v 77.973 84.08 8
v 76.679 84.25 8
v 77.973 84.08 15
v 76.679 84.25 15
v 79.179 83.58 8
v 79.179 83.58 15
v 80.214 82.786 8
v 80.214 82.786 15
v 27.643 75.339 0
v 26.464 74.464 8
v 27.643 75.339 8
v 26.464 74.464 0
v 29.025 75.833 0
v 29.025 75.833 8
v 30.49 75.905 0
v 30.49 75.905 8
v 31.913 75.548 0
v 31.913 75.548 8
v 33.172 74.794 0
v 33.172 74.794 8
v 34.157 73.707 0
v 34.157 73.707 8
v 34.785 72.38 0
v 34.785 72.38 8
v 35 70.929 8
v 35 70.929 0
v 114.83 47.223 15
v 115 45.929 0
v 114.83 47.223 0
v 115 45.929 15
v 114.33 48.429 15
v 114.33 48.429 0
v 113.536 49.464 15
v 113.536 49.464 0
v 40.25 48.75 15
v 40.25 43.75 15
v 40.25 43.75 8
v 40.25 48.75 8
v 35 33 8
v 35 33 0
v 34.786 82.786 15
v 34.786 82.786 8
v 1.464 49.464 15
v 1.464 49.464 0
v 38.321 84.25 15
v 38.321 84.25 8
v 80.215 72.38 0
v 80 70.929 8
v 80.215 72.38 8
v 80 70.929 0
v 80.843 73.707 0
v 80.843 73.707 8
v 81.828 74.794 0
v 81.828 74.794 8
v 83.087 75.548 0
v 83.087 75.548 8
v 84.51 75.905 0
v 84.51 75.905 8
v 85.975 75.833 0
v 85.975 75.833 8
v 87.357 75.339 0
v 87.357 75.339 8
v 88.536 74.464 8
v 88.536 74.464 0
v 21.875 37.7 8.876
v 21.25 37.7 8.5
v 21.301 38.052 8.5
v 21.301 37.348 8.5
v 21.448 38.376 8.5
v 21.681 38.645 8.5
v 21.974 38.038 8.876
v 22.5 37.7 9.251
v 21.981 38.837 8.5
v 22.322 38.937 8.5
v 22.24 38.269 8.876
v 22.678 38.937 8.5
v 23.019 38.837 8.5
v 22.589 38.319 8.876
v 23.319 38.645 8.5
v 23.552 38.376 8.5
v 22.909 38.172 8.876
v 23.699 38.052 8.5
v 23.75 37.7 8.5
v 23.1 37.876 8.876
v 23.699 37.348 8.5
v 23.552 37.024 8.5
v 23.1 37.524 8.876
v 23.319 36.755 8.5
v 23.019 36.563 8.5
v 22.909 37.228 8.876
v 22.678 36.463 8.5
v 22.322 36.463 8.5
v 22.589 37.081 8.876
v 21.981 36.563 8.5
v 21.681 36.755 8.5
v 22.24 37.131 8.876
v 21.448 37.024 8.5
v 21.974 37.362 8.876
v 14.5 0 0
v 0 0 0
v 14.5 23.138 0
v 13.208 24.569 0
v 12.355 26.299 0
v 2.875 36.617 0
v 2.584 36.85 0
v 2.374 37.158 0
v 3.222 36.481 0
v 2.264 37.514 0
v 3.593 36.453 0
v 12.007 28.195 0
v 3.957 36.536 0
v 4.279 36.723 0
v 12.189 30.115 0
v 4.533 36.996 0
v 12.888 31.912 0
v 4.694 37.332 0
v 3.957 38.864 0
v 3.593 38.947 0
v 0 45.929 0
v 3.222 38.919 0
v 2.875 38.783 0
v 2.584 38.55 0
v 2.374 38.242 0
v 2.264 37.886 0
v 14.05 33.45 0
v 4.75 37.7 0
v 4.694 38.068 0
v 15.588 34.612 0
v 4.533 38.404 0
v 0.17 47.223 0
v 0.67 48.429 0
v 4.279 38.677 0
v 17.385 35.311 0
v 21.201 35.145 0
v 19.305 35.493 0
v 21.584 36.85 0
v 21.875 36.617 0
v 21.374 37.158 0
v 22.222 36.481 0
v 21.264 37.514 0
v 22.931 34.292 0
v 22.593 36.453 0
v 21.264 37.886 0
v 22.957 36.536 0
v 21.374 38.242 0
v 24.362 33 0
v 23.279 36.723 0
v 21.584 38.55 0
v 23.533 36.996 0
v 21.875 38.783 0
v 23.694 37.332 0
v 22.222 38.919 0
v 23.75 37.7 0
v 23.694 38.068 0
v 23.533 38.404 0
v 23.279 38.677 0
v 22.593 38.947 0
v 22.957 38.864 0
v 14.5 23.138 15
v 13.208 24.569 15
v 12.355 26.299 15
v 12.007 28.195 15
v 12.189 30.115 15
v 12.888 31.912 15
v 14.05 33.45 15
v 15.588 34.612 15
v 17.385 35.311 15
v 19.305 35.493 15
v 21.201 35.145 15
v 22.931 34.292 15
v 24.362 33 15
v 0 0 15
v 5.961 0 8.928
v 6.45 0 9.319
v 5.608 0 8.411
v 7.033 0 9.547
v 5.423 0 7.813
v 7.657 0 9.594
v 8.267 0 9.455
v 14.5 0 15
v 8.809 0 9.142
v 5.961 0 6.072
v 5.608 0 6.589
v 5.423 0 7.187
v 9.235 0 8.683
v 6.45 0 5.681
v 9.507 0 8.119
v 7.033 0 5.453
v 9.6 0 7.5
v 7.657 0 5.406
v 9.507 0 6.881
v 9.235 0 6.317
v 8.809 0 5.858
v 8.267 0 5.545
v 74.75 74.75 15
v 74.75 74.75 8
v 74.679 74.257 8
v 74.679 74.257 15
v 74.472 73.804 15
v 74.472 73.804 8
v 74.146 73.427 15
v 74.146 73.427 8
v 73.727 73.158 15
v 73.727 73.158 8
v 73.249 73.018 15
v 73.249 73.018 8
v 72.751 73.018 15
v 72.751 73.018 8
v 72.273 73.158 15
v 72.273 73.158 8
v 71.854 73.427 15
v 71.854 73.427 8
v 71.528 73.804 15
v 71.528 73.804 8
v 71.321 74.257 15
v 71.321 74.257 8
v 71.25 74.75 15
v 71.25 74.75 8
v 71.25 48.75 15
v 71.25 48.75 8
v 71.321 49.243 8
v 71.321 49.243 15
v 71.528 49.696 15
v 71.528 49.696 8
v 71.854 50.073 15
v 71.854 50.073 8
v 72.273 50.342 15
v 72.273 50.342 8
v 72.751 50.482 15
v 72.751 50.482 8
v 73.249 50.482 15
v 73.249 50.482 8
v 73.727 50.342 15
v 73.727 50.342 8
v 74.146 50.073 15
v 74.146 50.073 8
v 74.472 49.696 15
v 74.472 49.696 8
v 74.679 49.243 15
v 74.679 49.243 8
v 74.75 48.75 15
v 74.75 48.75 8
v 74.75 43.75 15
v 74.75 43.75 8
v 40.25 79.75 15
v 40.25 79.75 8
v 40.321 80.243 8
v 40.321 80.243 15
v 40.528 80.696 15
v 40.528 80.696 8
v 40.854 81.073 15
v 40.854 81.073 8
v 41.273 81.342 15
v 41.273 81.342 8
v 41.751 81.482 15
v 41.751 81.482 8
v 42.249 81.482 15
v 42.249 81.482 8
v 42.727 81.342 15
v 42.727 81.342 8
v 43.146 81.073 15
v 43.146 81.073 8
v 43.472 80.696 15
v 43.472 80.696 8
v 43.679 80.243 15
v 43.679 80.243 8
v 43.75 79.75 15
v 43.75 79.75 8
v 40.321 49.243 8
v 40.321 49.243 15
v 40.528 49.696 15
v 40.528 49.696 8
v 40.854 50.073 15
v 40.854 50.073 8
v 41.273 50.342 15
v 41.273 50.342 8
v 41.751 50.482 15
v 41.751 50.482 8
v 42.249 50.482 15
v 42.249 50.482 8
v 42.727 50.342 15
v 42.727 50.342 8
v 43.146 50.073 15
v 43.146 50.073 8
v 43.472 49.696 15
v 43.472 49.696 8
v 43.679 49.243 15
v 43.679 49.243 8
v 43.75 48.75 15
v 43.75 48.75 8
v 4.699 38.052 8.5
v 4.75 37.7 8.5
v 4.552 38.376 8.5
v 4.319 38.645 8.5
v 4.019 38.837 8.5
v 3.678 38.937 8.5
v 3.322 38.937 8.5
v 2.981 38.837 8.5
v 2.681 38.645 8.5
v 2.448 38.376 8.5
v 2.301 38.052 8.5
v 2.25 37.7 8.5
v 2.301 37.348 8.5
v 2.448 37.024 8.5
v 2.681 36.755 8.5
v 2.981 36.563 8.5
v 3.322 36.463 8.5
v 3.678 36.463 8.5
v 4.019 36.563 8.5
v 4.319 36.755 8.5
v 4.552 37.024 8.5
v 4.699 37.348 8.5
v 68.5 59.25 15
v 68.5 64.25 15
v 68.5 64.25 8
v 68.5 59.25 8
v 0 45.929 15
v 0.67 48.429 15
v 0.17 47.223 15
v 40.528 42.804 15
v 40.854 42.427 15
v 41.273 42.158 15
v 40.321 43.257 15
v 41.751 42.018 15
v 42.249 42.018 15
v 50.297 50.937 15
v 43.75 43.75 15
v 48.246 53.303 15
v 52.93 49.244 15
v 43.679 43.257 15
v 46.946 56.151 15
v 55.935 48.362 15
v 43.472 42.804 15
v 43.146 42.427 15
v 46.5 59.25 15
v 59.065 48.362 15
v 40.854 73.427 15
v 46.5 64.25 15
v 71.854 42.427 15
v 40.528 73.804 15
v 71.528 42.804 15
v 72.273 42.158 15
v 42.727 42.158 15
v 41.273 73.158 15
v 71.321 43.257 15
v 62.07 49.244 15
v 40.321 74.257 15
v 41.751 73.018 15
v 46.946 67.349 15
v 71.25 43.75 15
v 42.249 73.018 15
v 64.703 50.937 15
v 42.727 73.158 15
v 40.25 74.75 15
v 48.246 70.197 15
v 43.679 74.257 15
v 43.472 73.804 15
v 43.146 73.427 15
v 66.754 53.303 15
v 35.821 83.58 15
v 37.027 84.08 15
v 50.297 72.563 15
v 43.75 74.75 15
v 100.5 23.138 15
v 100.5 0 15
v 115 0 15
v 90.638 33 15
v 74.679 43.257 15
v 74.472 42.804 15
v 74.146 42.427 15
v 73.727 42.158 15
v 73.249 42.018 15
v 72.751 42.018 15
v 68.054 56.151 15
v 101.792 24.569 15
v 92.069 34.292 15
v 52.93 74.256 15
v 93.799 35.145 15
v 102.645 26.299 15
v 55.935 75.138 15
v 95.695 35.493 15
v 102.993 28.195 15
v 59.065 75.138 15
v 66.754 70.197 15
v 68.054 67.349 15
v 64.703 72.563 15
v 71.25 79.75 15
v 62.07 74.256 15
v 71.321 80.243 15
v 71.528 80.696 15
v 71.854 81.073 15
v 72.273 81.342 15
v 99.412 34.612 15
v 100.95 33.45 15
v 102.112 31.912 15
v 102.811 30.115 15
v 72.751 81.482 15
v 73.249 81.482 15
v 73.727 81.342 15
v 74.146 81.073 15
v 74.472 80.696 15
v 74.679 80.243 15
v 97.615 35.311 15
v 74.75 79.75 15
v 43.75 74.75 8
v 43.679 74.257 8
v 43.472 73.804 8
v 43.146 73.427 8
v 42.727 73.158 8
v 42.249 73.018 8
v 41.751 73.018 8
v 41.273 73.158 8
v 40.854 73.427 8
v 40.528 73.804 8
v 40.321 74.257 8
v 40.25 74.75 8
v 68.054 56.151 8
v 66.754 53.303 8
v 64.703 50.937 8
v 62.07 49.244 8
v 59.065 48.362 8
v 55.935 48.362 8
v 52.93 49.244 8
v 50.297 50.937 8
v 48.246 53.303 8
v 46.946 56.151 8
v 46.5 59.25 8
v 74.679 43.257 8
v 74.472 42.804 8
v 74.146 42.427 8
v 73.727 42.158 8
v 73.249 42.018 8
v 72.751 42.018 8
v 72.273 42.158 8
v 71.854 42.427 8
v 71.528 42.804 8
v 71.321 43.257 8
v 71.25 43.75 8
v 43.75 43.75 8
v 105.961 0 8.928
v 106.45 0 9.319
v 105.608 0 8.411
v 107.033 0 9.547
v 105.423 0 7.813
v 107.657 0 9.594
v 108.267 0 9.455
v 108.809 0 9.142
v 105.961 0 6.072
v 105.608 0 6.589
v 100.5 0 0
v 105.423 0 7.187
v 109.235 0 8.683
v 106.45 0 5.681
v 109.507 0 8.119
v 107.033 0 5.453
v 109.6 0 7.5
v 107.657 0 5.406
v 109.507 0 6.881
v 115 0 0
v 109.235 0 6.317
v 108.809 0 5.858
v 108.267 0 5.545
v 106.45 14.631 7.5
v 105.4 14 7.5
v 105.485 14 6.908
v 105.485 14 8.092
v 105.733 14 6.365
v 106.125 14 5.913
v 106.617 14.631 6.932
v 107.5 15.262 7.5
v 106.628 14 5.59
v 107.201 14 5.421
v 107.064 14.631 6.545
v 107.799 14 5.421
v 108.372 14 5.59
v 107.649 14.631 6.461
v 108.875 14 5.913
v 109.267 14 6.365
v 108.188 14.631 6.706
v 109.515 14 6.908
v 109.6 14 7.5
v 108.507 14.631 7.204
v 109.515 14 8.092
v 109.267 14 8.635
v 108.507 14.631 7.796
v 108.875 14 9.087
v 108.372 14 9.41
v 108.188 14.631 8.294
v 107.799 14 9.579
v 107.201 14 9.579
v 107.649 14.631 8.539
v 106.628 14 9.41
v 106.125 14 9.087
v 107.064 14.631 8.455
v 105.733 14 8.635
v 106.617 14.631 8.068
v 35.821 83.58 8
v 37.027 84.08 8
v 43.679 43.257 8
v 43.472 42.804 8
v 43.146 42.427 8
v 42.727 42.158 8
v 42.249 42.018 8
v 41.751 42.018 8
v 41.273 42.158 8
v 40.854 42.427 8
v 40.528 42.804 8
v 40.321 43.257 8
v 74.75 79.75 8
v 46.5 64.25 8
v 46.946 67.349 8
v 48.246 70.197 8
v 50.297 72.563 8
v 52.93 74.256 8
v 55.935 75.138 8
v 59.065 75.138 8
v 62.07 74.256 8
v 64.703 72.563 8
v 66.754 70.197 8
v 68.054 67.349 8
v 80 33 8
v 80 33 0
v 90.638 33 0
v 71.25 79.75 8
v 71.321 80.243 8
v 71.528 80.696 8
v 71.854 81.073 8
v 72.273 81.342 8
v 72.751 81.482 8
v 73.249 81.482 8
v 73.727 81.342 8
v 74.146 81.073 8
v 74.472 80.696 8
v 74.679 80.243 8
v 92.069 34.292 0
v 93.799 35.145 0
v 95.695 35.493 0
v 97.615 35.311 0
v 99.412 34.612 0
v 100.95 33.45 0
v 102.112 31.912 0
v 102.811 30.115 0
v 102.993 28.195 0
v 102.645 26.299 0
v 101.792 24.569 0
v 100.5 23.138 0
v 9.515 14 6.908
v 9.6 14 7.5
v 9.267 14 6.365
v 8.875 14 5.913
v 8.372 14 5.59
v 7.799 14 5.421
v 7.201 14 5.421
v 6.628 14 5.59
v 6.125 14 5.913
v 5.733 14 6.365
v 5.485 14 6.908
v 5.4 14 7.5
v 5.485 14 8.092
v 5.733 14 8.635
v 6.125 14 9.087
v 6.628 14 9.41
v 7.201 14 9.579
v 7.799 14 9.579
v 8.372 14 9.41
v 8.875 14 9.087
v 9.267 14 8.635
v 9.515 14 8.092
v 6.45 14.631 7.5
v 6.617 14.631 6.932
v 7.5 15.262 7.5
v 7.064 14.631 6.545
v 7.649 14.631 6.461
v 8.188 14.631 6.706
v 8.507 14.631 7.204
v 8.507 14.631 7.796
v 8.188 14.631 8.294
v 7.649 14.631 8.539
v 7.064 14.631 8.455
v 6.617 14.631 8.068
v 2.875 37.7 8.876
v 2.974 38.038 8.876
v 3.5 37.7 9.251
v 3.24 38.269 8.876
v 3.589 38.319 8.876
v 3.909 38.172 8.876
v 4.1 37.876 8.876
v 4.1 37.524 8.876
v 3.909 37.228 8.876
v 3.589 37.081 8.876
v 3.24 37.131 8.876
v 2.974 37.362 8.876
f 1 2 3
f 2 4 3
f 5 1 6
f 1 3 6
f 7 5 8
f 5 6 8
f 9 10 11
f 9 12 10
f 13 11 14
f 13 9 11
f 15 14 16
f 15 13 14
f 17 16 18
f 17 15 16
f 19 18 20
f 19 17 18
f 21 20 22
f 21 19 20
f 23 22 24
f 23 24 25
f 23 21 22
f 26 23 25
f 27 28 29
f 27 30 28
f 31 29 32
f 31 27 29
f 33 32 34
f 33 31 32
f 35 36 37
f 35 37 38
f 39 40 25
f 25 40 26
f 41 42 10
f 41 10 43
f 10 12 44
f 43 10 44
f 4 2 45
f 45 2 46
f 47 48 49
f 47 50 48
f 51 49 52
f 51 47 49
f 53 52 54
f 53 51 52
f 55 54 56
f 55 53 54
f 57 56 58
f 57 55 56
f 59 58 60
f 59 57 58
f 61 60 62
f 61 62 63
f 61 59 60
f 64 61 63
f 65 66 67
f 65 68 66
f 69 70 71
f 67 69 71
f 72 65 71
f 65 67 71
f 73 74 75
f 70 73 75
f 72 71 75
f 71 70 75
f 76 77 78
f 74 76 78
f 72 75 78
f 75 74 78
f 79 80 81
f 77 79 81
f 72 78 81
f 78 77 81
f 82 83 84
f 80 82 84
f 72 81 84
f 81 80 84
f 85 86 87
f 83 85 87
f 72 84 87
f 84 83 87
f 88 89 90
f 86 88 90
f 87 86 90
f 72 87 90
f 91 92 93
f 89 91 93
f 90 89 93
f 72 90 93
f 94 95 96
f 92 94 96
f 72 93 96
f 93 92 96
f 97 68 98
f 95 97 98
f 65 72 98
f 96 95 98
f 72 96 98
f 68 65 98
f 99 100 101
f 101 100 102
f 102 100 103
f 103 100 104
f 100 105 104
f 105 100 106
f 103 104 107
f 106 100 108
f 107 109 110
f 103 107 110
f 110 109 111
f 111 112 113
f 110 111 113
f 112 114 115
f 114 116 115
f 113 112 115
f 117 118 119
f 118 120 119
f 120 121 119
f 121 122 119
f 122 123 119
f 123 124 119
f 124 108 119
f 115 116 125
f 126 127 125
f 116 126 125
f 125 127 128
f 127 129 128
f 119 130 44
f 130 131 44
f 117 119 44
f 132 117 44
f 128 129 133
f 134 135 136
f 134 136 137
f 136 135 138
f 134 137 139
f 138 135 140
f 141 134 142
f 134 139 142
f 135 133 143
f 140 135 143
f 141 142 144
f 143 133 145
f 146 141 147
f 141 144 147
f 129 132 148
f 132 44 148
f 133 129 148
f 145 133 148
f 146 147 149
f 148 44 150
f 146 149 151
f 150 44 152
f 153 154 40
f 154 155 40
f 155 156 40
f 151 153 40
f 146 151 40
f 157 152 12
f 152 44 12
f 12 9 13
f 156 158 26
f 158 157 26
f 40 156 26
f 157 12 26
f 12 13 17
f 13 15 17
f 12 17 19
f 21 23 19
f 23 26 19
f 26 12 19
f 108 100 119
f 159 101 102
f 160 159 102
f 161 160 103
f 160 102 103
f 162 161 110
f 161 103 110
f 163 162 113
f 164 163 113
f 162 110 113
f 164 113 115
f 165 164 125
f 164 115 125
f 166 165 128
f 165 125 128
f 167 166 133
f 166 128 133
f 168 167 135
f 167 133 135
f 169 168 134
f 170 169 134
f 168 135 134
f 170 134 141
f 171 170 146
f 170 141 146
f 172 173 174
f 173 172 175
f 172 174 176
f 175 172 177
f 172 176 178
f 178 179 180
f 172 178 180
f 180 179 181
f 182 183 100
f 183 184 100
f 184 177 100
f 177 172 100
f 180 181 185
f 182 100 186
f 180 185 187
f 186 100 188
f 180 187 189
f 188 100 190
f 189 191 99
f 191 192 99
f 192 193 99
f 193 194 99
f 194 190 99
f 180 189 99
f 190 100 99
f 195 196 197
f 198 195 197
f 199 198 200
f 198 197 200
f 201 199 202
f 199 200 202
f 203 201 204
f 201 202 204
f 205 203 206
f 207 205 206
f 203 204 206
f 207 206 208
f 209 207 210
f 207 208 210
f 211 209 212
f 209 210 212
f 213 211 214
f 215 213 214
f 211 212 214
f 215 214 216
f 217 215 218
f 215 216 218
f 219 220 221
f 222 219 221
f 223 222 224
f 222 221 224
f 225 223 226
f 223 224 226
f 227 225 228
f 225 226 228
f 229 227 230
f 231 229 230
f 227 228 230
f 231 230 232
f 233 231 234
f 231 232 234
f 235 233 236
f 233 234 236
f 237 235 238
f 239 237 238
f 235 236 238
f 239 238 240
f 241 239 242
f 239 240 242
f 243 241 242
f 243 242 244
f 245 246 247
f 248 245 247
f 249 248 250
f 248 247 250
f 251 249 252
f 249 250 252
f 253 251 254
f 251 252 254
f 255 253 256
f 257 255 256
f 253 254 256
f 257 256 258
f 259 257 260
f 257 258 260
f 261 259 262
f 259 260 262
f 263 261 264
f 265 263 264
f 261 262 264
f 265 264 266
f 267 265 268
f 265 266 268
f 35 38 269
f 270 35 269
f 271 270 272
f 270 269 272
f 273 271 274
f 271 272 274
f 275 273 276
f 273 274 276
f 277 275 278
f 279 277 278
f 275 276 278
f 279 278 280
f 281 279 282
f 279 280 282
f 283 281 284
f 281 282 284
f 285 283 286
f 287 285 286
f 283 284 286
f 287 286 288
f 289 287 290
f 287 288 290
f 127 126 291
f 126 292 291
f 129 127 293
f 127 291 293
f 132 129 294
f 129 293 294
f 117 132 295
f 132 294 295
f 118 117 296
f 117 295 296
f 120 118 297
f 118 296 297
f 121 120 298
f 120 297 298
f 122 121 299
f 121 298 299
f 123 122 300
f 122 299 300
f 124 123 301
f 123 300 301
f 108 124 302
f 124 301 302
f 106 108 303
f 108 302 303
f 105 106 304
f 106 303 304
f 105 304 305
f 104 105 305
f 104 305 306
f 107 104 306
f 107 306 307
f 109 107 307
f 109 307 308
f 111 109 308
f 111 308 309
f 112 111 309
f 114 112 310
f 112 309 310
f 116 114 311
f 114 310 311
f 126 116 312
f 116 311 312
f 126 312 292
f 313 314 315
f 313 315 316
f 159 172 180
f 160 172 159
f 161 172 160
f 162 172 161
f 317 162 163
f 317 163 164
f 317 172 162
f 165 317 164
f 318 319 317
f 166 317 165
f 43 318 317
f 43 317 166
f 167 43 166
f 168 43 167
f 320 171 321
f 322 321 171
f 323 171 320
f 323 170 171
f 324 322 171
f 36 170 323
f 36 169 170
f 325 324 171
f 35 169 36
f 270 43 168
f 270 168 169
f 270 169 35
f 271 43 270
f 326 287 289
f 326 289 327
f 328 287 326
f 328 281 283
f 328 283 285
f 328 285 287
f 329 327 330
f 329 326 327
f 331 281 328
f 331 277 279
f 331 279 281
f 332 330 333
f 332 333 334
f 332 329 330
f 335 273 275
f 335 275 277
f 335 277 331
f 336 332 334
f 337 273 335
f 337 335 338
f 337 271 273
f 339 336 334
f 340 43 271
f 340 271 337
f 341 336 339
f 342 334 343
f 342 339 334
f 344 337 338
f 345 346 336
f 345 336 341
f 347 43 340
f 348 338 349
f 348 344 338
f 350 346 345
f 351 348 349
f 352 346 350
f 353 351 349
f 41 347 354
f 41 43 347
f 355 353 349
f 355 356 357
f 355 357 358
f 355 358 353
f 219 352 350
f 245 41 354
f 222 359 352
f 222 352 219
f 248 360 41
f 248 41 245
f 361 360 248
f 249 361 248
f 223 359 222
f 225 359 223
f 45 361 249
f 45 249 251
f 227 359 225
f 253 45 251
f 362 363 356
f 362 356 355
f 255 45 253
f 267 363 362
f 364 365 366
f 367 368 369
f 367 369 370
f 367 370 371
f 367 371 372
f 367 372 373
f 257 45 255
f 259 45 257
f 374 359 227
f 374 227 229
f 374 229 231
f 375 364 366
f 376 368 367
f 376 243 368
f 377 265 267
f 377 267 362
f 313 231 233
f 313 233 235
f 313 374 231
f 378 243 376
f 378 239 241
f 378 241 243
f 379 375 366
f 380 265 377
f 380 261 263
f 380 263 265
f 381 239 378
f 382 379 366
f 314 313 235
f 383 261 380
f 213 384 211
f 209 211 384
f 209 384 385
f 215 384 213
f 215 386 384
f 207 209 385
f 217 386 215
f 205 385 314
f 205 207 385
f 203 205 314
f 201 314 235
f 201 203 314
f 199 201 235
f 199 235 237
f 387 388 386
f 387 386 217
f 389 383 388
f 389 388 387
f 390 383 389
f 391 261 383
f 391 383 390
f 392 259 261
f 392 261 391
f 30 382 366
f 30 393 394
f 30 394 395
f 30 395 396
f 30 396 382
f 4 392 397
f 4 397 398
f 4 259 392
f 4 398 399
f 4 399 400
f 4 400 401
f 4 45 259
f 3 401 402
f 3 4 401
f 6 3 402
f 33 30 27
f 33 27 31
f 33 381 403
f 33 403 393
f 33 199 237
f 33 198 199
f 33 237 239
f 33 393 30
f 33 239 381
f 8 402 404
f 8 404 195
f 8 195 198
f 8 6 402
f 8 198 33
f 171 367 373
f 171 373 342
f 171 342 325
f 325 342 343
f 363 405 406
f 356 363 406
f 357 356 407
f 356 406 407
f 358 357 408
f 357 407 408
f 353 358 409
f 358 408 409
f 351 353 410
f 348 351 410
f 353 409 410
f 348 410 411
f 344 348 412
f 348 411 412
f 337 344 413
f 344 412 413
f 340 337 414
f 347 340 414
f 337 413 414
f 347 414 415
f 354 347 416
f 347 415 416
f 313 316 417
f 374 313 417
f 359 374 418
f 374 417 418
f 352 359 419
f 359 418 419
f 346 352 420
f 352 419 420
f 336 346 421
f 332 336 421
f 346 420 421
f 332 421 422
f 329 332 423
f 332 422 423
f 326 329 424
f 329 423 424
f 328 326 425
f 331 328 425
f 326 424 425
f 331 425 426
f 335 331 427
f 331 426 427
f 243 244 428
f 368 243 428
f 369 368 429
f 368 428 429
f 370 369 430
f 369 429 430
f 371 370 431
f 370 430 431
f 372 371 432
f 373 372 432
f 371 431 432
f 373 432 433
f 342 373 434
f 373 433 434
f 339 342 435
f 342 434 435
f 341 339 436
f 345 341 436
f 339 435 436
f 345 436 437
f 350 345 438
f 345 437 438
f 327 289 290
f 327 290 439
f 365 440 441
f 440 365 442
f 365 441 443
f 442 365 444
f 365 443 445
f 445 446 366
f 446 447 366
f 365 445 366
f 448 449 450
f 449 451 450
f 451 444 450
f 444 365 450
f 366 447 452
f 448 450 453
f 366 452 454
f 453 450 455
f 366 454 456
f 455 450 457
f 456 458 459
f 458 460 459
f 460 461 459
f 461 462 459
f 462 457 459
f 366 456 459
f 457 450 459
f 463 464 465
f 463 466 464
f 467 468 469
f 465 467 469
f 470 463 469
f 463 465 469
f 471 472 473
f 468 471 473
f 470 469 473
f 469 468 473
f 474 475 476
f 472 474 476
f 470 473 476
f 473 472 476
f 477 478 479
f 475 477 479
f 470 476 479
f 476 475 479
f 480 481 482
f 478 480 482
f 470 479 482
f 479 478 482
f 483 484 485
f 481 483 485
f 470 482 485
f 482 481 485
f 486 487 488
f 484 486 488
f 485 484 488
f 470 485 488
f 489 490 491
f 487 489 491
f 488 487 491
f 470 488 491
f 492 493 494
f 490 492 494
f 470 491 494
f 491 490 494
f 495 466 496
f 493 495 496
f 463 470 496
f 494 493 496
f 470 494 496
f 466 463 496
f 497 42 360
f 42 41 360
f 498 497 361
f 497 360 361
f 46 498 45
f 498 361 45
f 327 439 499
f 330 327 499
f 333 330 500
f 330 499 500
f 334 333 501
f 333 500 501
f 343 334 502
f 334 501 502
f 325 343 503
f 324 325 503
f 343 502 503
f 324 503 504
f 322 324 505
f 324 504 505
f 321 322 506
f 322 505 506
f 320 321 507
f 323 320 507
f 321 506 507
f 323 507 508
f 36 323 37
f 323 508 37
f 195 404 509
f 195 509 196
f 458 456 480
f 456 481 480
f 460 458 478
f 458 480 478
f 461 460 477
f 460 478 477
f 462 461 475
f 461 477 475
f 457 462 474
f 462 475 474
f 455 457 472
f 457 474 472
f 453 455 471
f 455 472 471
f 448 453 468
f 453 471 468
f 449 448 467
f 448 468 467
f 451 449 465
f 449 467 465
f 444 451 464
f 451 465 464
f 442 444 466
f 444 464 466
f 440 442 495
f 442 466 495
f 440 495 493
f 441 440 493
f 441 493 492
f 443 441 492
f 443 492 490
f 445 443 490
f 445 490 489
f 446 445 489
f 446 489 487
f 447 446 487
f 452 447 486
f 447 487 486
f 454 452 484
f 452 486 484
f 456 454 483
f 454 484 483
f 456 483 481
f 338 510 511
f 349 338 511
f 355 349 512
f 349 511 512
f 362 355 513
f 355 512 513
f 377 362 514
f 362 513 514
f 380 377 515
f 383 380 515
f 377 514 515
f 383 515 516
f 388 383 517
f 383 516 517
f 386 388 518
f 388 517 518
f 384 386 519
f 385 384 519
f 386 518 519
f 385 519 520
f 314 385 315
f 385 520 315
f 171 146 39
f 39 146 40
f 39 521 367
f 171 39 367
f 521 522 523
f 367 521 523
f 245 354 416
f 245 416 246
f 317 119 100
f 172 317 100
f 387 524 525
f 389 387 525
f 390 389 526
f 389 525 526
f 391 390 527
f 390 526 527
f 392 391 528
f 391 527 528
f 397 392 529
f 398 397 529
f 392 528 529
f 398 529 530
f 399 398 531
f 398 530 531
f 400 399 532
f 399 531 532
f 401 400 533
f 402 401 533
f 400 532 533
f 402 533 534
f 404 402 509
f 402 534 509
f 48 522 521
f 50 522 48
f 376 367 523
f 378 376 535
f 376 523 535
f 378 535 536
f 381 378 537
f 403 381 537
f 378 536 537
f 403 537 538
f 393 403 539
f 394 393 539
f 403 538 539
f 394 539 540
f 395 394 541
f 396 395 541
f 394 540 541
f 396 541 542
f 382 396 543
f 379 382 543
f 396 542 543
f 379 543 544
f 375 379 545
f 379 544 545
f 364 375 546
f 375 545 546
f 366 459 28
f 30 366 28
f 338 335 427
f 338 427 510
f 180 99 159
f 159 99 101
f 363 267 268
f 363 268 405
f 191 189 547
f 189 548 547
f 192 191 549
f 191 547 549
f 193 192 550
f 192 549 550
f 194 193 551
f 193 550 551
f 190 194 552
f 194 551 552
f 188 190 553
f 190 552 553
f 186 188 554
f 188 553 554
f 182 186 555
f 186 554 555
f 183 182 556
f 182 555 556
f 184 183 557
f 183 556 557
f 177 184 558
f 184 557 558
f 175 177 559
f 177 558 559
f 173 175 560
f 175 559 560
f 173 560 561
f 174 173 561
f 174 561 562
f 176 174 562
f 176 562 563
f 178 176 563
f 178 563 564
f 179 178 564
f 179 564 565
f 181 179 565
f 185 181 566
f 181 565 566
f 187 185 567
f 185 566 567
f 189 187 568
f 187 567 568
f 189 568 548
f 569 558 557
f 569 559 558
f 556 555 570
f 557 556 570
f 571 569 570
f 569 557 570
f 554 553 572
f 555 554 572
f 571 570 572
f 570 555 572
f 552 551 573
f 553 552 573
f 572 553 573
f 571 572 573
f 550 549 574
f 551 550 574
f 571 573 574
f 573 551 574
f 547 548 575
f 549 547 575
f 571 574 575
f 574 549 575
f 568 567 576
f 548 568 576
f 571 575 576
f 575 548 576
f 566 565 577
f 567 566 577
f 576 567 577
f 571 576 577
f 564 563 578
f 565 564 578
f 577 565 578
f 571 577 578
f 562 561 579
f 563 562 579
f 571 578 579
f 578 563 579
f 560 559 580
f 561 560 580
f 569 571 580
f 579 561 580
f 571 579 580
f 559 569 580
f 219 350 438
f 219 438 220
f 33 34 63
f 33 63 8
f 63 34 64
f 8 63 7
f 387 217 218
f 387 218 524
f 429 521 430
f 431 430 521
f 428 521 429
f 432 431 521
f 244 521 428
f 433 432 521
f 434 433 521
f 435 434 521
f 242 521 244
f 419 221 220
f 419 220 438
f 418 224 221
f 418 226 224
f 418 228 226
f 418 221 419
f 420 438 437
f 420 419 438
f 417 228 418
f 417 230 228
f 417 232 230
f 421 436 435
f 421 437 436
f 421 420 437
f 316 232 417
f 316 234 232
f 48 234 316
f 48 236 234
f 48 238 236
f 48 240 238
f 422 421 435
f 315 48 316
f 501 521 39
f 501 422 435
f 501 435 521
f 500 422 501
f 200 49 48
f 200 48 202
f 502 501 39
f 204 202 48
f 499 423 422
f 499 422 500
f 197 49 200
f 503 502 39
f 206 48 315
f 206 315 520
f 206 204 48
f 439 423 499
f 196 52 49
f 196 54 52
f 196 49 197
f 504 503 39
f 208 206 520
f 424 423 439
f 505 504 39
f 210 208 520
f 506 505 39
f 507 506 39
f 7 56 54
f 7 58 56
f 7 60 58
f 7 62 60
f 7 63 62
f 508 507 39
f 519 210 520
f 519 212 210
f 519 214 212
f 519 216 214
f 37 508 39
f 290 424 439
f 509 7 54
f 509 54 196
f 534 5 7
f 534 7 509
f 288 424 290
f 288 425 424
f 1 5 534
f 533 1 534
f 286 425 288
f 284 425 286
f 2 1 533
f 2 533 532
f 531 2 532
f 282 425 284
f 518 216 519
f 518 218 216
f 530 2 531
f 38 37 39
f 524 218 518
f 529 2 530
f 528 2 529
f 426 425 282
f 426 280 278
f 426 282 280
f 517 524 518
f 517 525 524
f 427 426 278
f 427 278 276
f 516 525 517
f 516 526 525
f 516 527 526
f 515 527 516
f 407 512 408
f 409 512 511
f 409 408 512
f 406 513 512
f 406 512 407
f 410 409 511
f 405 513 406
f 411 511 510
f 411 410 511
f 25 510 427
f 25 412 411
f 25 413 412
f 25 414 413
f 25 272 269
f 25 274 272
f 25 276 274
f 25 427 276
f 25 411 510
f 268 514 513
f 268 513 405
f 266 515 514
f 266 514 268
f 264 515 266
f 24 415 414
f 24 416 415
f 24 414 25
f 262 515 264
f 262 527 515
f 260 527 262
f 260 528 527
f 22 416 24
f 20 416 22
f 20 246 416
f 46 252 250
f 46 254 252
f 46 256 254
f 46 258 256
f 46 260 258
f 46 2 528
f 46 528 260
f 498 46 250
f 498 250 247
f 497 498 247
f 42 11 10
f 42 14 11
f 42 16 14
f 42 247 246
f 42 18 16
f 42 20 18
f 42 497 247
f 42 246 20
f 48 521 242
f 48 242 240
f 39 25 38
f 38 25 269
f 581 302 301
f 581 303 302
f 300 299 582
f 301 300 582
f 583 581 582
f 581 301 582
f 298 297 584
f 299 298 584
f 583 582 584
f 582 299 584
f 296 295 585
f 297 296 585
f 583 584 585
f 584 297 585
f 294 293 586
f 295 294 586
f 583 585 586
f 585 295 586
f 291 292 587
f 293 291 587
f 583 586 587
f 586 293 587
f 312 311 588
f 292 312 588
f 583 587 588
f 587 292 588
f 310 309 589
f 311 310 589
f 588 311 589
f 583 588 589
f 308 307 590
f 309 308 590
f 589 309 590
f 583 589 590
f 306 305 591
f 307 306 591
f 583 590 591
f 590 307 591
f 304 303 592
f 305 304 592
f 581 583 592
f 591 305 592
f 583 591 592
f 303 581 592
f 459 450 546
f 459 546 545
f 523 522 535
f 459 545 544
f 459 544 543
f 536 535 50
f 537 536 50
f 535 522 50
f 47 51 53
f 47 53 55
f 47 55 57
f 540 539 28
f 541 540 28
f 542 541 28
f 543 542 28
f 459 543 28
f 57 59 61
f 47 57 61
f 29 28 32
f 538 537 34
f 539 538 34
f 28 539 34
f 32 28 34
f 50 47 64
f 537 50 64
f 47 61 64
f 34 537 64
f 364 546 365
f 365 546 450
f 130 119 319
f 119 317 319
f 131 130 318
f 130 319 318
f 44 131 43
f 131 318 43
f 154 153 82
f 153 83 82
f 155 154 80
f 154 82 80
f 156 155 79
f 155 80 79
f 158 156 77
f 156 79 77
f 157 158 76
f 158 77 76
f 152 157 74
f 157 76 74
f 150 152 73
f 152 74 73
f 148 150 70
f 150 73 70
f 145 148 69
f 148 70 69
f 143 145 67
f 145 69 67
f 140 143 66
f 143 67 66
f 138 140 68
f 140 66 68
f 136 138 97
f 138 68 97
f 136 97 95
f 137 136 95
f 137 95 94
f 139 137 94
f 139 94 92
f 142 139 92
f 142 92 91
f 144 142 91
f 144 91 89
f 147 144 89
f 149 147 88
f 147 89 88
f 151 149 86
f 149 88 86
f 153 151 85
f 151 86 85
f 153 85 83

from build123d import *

# Parameters (mm, degrees)
AUFSATZ_LINEAR_AUSTRAGEN1_DEPTH = 15
M5_GEWINDEBOHRUNG1_D            = 4.2
M5_GEWINDEBOHRUNG1_DEPTH        = 14
M5_GEWINDEBOHRUNG1_TIP          = 1.2618073
SKIZZE4_W                       = 45
SKIZZE4_H                       = 51.25
SCHNITT_LINEAR_AUSTRAGEN1_DEPTH = 8
VERRUNDUNG1_R                   = 5
VERRUNDUNG2_R                   = 5
M3_GEWINDEBOHRUNG1_D            = 2.5
M3_GEWINDEBOHRUNG1_DEPTH        = 8.5
M3_GEWINDEBOHRUNG1_TIP          = 0.751075774


with BuildPart() as part:
    # Skizze1 → Aufsatz-Linear austragen1 (new body)
    with BuildSketch(Plane.XY):
        with BuildLine():
            Line((100.5, 0), (115, 0))
            Line((115, 0), (115, 48))
            Line((115, 48), (78.75, 84.25))
            Line((78.75, 84.25), (36.25, 84.25))
            Line((36.25, 84.25), (0, 48))
            Line((0, 48), (0, 0))
            Line((0, 0), (14.5, 0))
            Line((14.5, 0), (14.5, 23.138097353))
            ThreePointArc((14.5, 23.138097353), (14.050252532, 33.449747468), (24.361902647, 33))
            Line((24.361902647, 33), (90.638097353, 33))
            ThreePointArc((90.638097353, 33), (100.949747468, 33.449747468), (100.5, 23.138097353))
            Line((100.5, 23.138097353), (100.5, 0))
        make_face()
        with BuildLine():
            Line((68.5, 64.25), (68.5, 59.25))
            ThreePointArc((68.5, 59.25), (57.5, 48.25), (46.5, 59.25))
            Line((46.5, 59.25), (46.5, 64.25))
            ThreePointArc((46.5, 64.25), (57.5, 75.25), (68.5, 64.25))
        make_face(mode=Mode.SUBTRACT)
        with BuildLine():
            Line((43.75, 79.75), (43.75, 74.75))
            ThreePointArc((43.75, 74.75), (42, 73), (40.25, 74.75))
            Line((40.25, 74.75), (40.25, 79.75))
            ThreePointArc((40.25, 79.75), (42, 81.5), (43.75, 79.75))
        make_face(mode=Mode.SUBTRACT)
        with BuildLine():
            Line((74.75, 79.75), (74.75, 74.75))
            ThreePointArc((74.75, 74.75), (73, 73), (71.25, 74.75))
            Line((71.25, 74.75), (71.25, 79.75))
            ThreePointArc((71.25, 79.75), (73, 81.5), (74.75, 79.75))
        make_face(mode=Mode.SUBTRACT)
        with BuildLine():
            Line((74.75, 48.75), (74.75, 43.75))
            ThreePointArc((74.75, 43.75), (73, 42), (71.25, 43.75))
            Line((71.25, 43.75), (71.25, 48.75))
            ThreePointArc((71.25, 48.75), (73, 50.5), (74.75, 48.75))
        make_face(mode=Mode.SUBTRACT)
        with BuildLine():
            Line((43.75, 48.75), (43.75, 43.75))
            ThreePointArc((43.75, 43.75), (42, 42), (40.25, 43.75))
            Line((40.25, 43.75), (40.25, 48.75))
            ThreePointArc((40.25, 48.75), (42, 50.5), (43.75, 48.75))
        make_face(mode=Mode.SUBTRACT)
    extrude(amount=AUFSATZ_LINEAR_AUSTRAGEN1_DEPTH)

    # M5 Gewindebohrung1
    with Locations(Plane(origin=(0, 0, 0), x_dir=(-1, 0, 0), z_dir=(0, -1, 0))):
        with Locations((-7.5, -7.5), (-107.5, -7.5)):
            Hole(M5_GEWINDEBOHRUNG1_D / 2, depth=M5_GEWINDEBOHRUNG1_DEPTH)
            with Locations((0, 0, -(M5_GEWINDEBOHRUNG1_DEPTH + M5_GEWINDEBOHRUNG1_TIP / 2))):  # 118° drill point
                Cone(0, M5_GEWINDEBOHRUNG1_D / 2, M5_GEWINDEBOHRUNG1_TIP, mode=Mode.SUBTRACT)

    # Skizze4 → Schnitt-Linear austragen1 (cut)
    with BuildSketch(Plane(origin=(0, 0, 0), x_dir=(-1, 0, 0), z_dir=(0, 0, -1))):
        with Locations((-57.5, 58.625)):
            Rectangle(SKIZZE4_W, SKIZZE4_H)
    extrude(amount=-SCHNITT_LINEAR_AUSTRAGEN1_DEPTH, mode=Mode.SUBTRACT)

    # Verrundung1
    verrundung1_edges = [part.edges().sort_by_distance(p)[0] for p in [
        (35, 83, 4),
        (80, 83, 4),
    ]]
    fillet(verrundung1_edges, radius=VERRUNDUNG1_R)

    # Verrundung2
    verrundung2_edges = [part.edges().sort_by_distance(p)[0] for p in [
        (0, 48, 7.5),
        (36.25, 84.25, 11.5),
        (78.75, 84.25, 11.5),
        (115, 48, 7.5),
    ]]
    fillet(verrundung2_edges, radius=VERRUNDUNG2_R)

    # M3 Gewindebohrung1
    with Locations(Plane(origin=(0, 0, 0), x_dir=(-1, 0, 0), z_dir=(0, 0, -1))):
        with Locations((-3.5, 37.7), (-22.5, 37.7)):
            Hole(M3_GEWINDEBOHRUNG1_D / 2, depth=M3_GEWINDEBOHRUNG1_DEPTH)
            with Locations((0, 0, -(M3_GEWINDEBOHRUNG1_DEPTH + M3_GEWINDEBOHRUNG1_TIP / 2))):  # 118° drill point
                Cone(0, M3_GEWINDEBOHRUNG1_D / 2, M3_GEWINDEBOHRUNG1_TIP, mode=Mode.SUBTRACT)


solid = part.part
